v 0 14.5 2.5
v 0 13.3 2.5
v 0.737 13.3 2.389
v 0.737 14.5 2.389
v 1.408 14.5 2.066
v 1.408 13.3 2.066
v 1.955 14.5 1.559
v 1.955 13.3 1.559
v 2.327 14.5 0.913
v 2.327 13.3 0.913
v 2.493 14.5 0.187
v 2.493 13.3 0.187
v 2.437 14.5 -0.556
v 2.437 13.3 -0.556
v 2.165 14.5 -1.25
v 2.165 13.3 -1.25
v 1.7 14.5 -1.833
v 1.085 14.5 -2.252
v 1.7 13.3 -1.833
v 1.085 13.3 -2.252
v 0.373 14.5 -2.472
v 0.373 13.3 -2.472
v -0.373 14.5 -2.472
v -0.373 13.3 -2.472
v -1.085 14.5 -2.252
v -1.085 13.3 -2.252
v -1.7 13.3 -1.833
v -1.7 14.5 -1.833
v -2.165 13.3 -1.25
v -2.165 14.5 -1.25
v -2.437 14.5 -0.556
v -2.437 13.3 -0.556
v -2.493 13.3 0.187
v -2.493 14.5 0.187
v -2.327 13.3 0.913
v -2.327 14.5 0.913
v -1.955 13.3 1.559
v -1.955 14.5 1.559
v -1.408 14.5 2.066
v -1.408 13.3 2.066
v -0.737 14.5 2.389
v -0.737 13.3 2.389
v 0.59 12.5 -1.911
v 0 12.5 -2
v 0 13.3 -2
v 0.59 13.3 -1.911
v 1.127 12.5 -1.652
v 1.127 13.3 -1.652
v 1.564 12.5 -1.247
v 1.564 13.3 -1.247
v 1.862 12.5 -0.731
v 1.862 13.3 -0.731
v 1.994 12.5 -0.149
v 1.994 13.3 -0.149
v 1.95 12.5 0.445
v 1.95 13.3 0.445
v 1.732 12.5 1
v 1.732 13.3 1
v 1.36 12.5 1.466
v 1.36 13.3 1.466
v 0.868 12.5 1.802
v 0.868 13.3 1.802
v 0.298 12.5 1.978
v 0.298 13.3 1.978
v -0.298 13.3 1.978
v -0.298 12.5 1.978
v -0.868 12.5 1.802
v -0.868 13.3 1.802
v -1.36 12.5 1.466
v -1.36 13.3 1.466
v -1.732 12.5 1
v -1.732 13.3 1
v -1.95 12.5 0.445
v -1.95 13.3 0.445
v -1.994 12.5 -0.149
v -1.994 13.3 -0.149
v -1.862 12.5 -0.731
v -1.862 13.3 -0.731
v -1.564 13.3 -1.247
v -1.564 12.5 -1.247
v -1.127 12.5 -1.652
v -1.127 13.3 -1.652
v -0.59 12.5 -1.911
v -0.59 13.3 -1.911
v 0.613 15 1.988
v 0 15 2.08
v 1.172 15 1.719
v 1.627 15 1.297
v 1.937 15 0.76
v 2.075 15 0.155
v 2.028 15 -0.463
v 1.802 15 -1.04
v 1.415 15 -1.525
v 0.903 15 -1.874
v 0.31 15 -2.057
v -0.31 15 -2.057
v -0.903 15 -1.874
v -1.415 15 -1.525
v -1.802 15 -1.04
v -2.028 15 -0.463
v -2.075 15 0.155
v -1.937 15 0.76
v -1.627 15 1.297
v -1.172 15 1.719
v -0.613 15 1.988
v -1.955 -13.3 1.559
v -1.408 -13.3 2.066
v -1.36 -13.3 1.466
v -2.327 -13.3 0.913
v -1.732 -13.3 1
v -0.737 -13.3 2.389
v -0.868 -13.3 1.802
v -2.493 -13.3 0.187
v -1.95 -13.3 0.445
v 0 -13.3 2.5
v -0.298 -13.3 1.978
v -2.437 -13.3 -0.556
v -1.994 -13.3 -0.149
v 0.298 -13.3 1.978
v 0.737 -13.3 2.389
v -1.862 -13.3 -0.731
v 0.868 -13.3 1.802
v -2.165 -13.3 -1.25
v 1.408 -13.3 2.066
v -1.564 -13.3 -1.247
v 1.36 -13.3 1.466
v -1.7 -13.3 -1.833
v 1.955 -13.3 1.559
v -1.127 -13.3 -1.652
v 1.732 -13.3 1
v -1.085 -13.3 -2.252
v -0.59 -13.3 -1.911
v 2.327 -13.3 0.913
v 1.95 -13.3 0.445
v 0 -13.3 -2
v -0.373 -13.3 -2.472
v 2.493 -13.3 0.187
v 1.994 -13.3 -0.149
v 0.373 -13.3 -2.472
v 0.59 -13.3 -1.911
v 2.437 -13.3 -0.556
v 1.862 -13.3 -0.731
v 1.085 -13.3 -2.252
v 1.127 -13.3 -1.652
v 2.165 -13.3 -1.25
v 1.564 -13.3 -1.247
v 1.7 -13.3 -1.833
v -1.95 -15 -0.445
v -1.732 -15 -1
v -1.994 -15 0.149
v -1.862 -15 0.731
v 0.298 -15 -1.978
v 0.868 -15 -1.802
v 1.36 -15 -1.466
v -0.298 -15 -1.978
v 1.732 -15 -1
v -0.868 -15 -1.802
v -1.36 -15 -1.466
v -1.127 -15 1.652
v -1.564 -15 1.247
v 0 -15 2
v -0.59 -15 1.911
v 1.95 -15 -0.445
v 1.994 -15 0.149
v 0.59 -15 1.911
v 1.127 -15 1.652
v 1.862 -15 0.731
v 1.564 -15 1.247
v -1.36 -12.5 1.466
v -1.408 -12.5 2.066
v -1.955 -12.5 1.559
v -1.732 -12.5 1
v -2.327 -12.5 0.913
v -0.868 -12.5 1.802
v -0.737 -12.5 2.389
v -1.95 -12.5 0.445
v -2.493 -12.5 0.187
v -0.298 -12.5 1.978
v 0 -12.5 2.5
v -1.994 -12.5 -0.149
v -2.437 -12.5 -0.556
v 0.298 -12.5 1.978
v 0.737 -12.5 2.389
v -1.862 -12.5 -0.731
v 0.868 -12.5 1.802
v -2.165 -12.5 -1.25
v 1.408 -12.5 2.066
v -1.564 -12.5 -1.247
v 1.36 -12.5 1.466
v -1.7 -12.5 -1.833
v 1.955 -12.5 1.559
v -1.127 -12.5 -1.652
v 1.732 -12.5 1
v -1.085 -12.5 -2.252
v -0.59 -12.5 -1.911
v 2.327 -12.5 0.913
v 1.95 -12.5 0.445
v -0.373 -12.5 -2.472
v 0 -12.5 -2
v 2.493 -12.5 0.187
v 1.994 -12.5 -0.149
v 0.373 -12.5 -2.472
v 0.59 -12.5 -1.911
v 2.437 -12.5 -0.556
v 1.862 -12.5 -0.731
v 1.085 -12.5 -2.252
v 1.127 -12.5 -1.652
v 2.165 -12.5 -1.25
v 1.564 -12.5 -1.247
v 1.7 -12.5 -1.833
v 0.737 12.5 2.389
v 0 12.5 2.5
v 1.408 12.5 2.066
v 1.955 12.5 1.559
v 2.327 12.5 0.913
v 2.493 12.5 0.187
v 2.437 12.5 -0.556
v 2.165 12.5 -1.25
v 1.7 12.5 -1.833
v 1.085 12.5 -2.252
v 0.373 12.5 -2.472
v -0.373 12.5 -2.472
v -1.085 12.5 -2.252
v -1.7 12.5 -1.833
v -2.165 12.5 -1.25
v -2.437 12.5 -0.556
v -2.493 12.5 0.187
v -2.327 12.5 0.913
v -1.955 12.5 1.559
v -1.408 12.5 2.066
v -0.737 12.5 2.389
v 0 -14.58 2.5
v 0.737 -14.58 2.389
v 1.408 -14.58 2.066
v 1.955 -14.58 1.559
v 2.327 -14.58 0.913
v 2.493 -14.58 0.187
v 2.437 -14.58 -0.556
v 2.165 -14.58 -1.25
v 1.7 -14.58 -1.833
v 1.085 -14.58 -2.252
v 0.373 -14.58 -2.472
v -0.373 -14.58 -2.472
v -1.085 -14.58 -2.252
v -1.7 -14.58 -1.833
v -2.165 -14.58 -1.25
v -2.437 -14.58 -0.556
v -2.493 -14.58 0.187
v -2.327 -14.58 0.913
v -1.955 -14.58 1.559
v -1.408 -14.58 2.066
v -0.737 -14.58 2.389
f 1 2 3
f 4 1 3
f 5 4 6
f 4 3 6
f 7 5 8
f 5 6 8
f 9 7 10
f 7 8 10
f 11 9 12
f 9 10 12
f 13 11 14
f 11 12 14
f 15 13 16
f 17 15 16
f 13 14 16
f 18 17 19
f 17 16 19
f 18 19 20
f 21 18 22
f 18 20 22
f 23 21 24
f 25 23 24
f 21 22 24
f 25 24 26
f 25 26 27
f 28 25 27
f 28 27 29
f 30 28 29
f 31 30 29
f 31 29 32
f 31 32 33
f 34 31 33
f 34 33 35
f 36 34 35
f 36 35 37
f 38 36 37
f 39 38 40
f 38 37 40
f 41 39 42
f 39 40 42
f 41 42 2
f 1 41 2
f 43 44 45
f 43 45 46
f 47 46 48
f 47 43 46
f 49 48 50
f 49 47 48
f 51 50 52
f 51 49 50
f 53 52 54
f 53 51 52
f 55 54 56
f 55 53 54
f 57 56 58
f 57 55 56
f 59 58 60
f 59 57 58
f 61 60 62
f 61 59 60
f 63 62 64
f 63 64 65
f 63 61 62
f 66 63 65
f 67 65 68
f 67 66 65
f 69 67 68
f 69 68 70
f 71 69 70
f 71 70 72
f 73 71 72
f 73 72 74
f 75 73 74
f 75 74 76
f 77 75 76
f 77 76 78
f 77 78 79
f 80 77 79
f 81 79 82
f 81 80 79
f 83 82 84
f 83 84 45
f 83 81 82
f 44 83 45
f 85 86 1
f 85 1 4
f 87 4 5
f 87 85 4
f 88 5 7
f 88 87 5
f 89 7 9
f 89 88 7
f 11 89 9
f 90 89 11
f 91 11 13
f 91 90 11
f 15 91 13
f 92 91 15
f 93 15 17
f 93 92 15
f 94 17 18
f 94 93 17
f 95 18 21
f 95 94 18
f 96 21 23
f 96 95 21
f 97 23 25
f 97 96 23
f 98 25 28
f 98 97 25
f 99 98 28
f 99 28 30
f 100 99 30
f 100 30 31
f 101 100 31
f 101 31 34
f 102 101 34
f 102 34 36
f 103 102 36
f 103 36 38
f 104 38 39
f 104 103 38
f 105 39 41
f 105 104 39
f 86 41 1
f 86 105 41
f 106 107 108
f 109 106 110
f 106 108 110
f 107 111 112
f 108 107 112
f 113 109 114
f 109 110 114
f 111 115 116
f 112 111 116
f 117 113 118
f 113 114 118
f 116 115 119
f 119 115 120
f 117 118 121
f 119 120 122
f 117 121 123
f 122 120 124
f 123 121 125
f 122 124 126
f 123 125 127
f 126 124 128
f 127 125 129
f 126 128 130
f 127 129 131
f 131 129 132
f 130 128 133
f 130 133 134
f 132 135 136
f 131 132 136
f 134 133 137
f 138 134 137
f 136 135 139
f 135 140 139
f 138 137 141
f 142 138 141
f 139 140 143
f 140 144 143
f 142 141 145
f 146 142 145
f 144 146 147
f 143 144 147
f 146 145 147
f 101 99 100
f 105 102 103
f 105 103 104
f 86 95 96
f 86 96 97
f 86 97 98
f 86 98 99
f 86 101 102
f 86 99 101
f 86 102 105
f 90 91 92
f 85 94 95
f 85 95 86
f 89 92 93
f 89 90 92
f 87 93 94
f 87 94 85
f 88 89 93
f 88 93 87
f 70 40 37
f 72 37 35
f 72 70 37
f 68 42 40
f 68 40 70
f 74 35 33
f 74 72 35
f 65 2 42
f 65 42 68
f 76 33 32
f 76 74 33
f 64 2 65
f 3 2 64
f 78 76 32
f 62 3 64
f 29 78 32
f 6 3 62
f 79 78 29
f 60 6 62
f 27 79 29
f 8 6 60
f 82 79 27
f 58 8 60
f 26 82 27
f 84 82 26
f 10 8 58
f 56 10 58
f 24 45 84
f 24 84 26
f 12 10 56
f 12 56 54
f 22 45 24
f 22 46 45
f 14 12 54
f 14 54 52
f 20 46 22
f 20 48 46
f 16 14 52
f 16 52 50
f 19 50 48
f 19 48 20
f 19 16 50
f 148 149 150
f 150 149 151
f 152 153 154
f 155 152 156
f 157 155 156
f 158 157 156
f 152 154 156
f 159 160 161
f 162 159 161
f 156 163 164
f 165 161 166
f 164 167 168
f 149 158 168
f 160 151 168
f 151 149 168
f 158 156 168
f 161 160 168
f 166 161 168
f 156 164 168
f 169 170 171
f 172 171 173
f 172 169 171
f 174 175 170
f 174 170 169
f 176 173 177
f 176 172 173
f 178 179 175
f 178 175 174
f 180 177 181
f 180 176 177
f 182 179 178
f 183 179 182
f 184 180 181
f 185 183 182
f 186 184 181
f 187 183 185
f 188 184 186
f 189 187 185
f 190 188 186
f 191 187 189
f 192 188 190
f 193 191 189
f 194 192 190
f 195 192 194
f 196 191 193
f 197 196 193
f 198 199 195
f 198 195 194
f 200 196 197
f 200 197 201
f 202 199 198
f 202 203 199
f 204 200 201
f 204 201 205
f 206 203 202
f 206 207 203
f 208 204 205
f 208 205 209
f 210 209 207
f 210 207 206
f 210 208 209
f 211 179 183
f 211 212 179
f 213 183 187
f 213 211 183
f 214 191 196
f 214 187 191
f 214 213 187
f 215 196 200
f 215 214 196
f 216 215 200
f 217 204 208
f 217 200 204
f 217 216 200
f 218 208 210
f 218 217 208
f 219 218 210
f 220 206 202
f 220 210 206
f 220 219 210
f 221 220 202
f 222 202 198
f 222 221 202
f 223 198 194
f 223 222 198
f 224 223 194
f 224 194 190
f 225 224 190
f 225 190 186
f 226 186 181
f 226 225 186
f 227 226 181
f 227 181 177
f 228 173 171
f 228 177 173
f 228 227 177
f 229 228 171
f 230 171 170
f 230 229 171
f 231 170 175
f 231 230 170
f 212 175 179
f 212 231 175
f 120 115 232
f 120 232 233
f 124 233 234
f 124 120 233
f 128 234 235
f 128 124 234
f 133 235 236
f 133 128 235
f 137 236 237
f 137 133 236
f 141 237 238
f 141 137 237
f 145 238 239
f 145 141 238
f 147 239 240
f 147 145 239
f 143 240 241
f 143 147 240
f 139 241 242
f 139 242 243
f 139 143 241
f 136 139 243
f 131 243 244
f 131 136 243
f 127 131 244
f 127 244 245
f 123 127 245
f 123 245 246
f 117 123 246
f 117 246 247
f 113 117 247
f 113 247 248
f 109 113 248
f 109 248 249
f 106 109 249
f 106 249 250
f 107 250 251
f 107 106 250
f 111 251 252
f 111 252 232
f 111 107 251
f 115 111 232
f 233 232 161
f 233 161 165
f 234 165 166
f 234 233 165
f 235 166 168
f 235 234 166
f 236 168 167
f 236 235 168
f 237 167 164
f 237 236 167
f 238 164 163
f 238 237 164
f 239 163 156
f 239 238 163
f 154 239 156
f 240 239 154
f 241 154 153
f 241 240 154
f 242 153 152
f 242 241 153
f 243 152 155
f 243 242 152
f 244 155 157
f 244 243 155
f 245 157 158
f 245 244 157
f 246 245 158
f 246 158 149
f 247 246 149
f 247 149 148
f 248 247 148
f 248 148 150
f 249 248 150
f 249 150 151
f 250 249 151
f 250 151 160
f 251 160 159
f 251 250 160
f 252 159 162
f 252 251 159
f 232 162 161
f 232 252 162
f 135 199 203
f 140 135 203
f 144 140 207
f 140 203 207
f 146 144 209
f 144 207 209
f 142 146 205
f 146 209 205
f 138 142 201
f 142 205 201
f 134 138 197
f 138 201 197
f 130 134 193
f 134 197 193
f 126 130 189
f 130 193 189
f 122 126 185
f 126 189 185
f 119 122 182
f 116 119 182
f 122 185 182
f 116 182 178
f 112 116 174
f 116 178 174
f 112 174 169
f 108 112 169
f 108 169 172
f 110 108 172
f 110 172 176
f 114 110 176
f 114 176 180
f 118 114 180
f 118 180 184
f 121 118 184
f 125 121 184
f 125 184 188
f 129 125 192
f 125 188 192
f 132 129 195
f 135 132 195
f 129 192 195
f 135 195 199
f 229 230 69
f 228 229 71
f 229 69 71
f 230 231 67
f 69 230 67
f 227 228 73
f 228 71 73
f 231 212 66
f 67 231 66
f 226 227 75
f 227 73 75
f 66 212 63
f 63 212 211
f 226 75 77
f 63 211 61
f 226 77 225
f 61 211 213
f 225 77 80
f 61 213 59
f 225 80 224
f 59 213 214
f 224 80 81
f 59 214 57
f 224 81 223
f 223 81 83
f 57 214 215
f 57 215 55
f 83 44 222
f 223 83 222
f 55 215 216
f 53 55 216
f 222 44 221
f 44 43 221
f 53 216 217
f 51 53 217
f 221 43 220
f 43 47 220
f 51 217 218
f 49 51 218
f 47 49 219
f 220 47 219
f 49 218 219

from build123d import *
from OCP.BRepFilletAPI import BRepFilletAPI_MakeChamfer

# Parameters (mm, degrees)
SKETCH_1_R          = 2.5
EXTRUDE_1_DEPTH     = 15
SKETCH_2_R          = 2.5
SKETCH_2_R_2        = 2
CUT_EXTRUDE_1_DEPTH = 0.8
CHAMFER_1_SIZE      = 0.5
CHAMFER_1_SIZE2     = 0.419549816


with BuildPart() as part:
    # 草图1 → 凸台-拉伸1 (new body)
    with BuildSketch(Plane(origin=(0, 0, 0), x_dir=(1, 0, 0), z_dir=(0, 1, 0))):
        with Locations(Location((0, 0, 0), (0, 0, 270))):
            Circle(SKETCH_1_R)
    extrude_1 = extrude(amount=EXTRUDE_1_DEPTH)

    # 草图2 → 切除-拉伸1 (cut)
    with BuildSketch(Plane(origin=(0, 12.5, 0), x_dir=(-1, 0, 0), z_dir=(0, -1, 0))):
        with Locations(Location((0, 0, 0), (0, 0, 90))):
            Circle(SKETCH_2_R)
        with Locations(Location((0, 0, 0), (0, 0, 90))):
            Circle(SKETCH_2_R_2, mode=Mode.SUBTRACT)
    cut_extrude_1 = extrude(amount=-CUT_EXTRUDE_1_DEPTH, mode=Mode.SUBTRACT)

    # 镜向1: 凸台-拉伸1, 切除-拉伸1 across plane
    add(extrude_1.mirror(Plane.ZX))
    add(cut_extrude_1.mirror(Plane.ZX), mode=Mode.SUBTRACT)

    # 倒角1: one chamfer whose edges measure the first distance from different faces: ONE call of the kernel's chamfer builder (chamfer() names one face for all edges)
    chamfer_1_edges_1 = [part.edges().sort_by_distance(p)[0] for p in [
        (0, -15, -2.5),
    ]]
    chamfer_1_side_1 = [part.faces().sort_by_distance(p)[0] for p in [
        (0, -15, 0),
    ]]
    chamfer_1_edges_2 = [part.edges().sort_by_distance(p)[0] for p in [
        (0, 15, -2.5),
    ]]
    chamfer_1_side_2 = [part.faces().sort_by_distance(p)[0] for p in [
        (0, 14.15, -2.5),
    ]]
    chamfer_1 = BRepFilletAPI_MakeChamfer(part.part.solid().wrapped)
    for e in chamfer_1_edges_1:
        chamfer_1.Add(CHAMFER_1_SIZE, CHAMFER_1_SIZE2, e.wrapped, chamfer_1_side_1[0].wrapped)  # the first distance lies on this face
    for e in chamfer_1_edges_2:
        chamfer_1.Add(CHAMFER_1_SIZE, CHAMFER_1_SIZE2, e.wrapped, chamfer_1_side_2[0].wrapped)  # the first distance lies on this face
    add(Compound.cast(chamfer_1.Shape()), mode=Mode.REPLACE)


solid = part.part
